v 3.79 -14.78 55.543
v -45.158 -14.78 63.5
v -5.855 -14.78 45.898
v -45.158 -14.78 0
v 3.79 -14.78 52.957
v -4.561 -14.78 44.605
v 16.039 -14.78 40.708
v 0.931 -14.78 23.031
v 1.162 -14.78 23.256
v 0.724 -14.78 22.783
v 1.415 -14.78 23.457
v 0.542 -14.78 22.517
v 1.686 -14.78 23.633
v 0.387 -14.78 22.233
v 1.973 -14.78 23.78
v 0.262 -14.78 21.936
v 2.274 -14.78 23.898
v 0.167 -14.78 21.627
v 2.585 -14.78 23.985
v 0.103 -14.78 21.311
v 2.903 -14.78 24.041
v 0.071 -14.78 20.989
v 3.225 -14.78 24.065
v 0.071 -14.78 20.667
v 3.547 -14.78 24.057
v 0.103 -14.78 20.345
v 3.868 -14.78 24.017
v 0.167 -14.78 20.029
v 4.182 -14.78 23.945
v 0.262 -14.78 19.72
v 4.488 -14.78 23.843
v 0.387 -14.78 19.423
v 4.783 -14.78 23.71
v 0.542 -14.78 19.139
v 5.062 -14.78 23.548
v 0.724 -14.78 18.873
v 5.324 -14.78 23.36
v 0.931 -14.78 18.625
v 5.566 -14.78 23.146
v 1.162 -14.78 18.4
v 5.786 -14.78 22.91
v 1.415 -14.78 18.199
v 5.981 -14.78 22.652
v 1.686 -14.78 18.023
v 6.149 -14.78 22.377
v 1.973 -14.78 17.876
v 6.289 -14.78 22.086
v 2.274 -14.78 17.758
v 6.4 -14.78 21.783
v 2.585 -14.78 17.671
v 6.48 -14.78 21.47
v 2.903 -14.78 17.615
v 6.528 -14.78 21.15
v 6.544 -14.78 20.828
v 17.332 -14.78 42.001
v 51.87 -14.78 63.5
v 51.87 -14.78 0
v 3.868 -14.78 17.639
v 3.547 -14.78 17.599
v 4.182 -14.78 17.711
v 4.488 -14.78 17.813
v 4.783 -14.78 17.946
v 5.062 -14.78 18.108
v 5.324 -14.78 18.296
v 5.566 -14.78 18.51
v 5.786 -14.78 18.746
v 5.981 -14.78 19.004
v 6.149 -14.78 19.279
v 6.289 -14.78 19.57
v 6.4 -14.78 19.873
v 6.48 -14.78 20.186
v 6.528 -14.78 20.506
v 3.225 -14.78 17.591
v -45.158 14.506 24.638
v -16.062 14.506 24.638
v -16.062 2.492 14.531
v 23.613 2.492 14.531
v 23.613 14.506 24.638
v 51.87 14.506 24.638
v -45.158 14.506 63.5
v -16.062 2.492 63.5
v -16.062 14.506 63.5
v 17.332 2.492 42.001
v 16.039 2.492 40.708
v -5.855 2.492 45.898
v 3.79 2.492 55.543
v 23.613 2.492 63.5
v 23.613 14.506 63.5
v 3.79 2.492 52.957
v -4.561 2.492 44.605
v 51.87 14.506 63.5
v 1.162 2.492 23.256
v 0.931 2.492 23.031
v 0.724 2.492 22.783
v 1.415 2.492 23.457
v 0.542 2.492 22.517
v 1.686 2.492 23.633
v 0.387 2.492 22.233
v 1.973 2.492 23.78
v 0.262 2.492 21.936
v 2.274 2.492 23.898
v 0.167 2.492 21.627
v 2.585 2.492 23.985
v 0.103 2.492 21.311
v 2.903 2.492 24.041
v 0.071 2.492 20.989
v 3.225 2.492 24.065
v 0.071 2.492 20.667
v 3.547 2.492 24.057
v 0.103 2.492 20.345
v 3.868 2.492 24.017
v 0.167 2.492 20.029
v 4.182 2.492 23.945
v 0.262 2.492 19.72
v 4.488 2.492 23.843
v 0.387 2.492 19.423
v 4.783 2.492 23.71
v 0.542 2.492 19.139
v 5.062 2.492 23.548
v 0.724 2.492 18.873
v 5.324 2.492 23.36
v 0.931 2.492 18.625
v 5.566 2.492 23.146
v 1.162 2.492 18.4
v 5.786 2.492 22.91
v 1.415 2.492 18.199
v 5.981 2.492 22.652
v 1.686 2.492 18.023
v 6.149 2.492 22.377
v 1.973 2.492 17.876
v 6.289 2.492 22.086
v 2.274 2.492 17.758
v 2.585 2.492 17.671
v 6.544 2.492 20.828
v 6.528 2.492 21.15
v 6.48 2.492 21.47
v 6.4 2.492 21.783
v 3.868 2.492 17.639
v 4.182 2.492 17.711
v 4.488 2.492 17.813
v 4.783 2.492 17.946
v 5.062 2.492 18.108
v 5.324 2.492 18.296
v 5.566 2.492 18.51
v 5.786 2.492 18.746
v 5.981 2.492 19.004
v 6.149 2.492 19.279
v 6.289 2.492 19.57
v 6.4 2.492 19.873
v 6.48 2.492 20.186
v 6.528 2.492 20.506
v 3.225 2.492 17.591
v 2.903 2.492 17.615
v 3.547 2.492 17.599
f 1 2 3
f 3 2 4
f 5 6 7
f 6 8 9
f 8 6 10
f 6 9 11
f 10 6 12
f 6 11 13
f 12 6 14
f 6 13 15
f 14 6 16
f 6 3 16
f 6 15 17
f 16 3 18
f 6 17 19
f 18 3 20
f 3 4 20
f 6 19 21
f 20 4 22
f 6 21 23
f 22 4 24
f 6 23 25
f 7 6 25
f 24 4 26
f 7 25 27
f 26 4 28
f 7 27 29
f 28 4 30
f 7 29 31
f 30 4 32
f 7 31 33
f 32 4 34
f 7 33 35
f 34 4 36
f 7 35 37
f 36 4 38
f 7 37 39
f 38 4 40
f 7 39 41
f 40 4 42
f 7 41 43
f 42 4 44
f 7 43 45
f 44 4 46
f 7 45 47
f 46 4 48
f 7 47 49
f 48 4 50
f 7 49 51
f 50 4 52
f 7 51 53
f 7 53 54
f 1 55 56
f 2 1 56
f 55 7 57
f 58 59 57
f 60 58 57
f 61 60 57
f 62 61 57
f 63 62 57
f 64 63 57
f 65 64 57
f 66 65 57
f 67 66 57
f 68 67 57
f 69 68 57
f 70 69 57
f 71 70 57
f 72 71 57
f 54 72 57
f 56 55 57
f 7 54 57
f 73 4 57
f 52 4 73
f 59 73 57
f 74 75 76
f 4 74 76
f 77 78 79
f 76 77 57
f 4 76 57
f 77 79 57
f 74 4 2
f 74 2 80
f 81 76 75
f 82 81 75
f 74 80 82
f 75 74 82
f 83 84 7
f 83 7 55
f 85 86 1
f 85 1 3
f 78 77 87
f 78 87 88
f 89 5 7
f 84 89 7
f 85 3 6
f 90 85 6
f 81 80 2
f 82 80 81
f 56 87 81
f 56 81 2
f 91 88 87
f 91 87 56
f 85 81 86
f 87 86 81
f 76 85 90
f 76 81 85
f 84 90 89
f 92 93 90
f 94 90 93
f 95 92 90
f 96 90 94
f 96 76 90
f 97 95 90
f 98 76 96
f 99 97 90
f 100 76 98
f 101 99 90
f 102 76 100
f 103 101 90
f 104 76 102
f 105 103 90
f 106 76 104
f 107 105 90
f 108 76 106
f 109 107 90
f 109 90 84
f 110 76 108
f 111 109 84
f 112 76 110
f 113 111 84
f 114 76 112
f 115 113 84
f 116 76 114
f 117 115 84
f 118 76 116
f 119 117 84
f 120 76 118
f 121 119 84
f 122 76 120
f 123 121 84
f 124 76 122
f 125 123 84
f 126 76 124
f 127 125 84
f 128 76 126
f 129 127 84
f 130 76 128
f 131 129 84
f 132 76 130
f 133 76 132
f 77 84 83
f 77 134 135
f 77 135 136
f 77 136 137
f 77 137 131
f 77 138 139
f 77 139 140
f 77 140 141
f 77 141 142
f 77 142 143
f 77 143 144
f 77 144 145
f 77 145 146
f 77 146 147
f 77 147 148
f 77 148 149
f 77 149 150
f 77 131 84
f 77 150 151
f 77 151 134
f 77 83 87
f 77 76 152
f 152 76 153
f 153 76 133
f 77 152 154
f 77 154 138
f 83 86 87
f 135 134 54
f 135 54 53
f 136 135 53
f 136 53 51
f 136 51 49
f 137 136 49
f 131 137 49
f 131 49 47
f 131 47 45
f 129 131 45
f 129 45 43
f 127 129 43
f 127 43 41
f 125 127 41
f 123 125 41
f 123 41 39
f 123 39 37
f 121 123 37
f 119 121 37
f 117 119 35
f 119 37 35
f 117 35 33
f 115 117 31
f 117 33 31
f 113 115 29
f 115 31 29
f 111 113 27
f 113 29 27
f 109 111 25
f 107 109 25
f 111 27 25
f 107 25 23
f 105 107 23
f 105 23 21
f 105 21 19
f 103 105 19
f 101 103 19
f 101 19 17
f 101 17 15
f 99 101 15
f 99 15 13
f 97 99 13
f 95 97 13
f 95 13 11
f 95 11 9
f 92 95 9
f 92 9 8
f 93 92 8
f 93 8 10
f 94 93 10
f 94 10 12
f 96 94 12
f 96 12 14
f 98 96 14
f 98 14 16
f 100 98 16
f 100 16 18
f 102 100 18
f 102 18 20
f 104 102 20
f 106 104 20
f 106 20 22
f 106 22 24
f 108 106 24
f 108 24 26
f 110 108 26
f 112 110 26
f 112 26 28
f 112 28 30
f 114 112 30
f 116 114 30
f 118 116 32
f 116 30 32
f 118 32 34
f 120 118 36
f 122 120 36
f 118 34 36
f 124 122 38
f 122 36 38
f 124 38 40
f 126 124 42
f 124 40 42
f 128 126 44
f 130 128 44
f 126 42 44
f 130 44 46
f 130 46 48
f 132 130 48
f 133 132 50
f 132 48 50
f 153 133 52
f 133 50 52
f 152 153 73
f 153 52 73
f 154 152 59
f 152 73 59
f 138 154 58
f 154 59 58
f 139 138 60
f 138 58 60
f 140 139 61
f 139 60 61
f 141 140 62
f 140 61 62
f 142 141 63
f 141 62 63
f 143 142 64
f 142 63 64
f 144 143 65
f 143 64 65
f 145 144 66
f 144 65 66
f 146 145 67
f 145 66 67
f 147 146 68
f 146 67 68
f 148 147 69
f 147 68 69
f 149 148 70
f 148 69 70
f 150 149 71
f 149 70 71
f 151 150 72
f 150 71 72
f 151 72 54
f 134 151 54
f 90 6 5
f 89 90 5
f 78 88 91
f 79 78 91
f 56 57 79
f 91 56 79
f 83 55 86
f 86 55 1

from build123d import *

# Parameters (mm, degrees)
F0_W     = 97.028
F0_H     = 29.2862
F2_DEPTH = 63.5
F1_W     = 39.6748
F1_H     = 12.0142
F3_DEPTH = 63.5
F5_DEPTH = 97.028
F6_R     = 3.2385
F7_DEPTH = 25.4
F9_DEPTH = 25.4


with BuildPart() as f2:
    # F0 (on Top) → F2 (new body)
    with BuildSketch(Plane.XY):
        with Locations((3.356052, -0.137089)):
            Rectangle(F0_W, F0_H)
    extrude(amount=F2_DEPTH)

    # F1 (on face) → F3 (cut)
    with BuildSketch(Plane.XY):
        with Locations((3.775152, 8.498911)):
            Rectangle(F1_W, F1_H)
    extrude(amount=F3_DEPTH, mode=Mode.SUBTRACT)

    # F4 (on face) → F5 (cut)
    with BuildSketch(Plane.YZ.offset(51.870052)):
        Polygon((14.506011, 0), (14.506011, 24.638), (-14.780189, 0), align=None)
    extrude(amount=-F5_DEPTH, mode=Mode.SUBTRACT)

    # F6 (on face) → F7 (cut)
    with BuildSketch(Plane.XZ.offset(14.780189)):
        with Locations((3.305252, 20.828)):
            Circle(F6_R)
    extrude(amount=-F7_DEPTH, mode=Mode.SUBTRACT)

    # F8 (on face) → F9 (cut)
    with BuildSketch(Plane.XZ.offset(14.780189)):
        Polygon((17.332412, 42.000698), (3.790186, 55.542924), (-5.854609, 45.898129), (-4.561452, 44.604972), (3.790186, 52.95661), (16.039255, 40.707541), align=None)
    extrude(amount=-F9_DEPTH, mode=Mode.SUBTRACT)


solid = f2.part
